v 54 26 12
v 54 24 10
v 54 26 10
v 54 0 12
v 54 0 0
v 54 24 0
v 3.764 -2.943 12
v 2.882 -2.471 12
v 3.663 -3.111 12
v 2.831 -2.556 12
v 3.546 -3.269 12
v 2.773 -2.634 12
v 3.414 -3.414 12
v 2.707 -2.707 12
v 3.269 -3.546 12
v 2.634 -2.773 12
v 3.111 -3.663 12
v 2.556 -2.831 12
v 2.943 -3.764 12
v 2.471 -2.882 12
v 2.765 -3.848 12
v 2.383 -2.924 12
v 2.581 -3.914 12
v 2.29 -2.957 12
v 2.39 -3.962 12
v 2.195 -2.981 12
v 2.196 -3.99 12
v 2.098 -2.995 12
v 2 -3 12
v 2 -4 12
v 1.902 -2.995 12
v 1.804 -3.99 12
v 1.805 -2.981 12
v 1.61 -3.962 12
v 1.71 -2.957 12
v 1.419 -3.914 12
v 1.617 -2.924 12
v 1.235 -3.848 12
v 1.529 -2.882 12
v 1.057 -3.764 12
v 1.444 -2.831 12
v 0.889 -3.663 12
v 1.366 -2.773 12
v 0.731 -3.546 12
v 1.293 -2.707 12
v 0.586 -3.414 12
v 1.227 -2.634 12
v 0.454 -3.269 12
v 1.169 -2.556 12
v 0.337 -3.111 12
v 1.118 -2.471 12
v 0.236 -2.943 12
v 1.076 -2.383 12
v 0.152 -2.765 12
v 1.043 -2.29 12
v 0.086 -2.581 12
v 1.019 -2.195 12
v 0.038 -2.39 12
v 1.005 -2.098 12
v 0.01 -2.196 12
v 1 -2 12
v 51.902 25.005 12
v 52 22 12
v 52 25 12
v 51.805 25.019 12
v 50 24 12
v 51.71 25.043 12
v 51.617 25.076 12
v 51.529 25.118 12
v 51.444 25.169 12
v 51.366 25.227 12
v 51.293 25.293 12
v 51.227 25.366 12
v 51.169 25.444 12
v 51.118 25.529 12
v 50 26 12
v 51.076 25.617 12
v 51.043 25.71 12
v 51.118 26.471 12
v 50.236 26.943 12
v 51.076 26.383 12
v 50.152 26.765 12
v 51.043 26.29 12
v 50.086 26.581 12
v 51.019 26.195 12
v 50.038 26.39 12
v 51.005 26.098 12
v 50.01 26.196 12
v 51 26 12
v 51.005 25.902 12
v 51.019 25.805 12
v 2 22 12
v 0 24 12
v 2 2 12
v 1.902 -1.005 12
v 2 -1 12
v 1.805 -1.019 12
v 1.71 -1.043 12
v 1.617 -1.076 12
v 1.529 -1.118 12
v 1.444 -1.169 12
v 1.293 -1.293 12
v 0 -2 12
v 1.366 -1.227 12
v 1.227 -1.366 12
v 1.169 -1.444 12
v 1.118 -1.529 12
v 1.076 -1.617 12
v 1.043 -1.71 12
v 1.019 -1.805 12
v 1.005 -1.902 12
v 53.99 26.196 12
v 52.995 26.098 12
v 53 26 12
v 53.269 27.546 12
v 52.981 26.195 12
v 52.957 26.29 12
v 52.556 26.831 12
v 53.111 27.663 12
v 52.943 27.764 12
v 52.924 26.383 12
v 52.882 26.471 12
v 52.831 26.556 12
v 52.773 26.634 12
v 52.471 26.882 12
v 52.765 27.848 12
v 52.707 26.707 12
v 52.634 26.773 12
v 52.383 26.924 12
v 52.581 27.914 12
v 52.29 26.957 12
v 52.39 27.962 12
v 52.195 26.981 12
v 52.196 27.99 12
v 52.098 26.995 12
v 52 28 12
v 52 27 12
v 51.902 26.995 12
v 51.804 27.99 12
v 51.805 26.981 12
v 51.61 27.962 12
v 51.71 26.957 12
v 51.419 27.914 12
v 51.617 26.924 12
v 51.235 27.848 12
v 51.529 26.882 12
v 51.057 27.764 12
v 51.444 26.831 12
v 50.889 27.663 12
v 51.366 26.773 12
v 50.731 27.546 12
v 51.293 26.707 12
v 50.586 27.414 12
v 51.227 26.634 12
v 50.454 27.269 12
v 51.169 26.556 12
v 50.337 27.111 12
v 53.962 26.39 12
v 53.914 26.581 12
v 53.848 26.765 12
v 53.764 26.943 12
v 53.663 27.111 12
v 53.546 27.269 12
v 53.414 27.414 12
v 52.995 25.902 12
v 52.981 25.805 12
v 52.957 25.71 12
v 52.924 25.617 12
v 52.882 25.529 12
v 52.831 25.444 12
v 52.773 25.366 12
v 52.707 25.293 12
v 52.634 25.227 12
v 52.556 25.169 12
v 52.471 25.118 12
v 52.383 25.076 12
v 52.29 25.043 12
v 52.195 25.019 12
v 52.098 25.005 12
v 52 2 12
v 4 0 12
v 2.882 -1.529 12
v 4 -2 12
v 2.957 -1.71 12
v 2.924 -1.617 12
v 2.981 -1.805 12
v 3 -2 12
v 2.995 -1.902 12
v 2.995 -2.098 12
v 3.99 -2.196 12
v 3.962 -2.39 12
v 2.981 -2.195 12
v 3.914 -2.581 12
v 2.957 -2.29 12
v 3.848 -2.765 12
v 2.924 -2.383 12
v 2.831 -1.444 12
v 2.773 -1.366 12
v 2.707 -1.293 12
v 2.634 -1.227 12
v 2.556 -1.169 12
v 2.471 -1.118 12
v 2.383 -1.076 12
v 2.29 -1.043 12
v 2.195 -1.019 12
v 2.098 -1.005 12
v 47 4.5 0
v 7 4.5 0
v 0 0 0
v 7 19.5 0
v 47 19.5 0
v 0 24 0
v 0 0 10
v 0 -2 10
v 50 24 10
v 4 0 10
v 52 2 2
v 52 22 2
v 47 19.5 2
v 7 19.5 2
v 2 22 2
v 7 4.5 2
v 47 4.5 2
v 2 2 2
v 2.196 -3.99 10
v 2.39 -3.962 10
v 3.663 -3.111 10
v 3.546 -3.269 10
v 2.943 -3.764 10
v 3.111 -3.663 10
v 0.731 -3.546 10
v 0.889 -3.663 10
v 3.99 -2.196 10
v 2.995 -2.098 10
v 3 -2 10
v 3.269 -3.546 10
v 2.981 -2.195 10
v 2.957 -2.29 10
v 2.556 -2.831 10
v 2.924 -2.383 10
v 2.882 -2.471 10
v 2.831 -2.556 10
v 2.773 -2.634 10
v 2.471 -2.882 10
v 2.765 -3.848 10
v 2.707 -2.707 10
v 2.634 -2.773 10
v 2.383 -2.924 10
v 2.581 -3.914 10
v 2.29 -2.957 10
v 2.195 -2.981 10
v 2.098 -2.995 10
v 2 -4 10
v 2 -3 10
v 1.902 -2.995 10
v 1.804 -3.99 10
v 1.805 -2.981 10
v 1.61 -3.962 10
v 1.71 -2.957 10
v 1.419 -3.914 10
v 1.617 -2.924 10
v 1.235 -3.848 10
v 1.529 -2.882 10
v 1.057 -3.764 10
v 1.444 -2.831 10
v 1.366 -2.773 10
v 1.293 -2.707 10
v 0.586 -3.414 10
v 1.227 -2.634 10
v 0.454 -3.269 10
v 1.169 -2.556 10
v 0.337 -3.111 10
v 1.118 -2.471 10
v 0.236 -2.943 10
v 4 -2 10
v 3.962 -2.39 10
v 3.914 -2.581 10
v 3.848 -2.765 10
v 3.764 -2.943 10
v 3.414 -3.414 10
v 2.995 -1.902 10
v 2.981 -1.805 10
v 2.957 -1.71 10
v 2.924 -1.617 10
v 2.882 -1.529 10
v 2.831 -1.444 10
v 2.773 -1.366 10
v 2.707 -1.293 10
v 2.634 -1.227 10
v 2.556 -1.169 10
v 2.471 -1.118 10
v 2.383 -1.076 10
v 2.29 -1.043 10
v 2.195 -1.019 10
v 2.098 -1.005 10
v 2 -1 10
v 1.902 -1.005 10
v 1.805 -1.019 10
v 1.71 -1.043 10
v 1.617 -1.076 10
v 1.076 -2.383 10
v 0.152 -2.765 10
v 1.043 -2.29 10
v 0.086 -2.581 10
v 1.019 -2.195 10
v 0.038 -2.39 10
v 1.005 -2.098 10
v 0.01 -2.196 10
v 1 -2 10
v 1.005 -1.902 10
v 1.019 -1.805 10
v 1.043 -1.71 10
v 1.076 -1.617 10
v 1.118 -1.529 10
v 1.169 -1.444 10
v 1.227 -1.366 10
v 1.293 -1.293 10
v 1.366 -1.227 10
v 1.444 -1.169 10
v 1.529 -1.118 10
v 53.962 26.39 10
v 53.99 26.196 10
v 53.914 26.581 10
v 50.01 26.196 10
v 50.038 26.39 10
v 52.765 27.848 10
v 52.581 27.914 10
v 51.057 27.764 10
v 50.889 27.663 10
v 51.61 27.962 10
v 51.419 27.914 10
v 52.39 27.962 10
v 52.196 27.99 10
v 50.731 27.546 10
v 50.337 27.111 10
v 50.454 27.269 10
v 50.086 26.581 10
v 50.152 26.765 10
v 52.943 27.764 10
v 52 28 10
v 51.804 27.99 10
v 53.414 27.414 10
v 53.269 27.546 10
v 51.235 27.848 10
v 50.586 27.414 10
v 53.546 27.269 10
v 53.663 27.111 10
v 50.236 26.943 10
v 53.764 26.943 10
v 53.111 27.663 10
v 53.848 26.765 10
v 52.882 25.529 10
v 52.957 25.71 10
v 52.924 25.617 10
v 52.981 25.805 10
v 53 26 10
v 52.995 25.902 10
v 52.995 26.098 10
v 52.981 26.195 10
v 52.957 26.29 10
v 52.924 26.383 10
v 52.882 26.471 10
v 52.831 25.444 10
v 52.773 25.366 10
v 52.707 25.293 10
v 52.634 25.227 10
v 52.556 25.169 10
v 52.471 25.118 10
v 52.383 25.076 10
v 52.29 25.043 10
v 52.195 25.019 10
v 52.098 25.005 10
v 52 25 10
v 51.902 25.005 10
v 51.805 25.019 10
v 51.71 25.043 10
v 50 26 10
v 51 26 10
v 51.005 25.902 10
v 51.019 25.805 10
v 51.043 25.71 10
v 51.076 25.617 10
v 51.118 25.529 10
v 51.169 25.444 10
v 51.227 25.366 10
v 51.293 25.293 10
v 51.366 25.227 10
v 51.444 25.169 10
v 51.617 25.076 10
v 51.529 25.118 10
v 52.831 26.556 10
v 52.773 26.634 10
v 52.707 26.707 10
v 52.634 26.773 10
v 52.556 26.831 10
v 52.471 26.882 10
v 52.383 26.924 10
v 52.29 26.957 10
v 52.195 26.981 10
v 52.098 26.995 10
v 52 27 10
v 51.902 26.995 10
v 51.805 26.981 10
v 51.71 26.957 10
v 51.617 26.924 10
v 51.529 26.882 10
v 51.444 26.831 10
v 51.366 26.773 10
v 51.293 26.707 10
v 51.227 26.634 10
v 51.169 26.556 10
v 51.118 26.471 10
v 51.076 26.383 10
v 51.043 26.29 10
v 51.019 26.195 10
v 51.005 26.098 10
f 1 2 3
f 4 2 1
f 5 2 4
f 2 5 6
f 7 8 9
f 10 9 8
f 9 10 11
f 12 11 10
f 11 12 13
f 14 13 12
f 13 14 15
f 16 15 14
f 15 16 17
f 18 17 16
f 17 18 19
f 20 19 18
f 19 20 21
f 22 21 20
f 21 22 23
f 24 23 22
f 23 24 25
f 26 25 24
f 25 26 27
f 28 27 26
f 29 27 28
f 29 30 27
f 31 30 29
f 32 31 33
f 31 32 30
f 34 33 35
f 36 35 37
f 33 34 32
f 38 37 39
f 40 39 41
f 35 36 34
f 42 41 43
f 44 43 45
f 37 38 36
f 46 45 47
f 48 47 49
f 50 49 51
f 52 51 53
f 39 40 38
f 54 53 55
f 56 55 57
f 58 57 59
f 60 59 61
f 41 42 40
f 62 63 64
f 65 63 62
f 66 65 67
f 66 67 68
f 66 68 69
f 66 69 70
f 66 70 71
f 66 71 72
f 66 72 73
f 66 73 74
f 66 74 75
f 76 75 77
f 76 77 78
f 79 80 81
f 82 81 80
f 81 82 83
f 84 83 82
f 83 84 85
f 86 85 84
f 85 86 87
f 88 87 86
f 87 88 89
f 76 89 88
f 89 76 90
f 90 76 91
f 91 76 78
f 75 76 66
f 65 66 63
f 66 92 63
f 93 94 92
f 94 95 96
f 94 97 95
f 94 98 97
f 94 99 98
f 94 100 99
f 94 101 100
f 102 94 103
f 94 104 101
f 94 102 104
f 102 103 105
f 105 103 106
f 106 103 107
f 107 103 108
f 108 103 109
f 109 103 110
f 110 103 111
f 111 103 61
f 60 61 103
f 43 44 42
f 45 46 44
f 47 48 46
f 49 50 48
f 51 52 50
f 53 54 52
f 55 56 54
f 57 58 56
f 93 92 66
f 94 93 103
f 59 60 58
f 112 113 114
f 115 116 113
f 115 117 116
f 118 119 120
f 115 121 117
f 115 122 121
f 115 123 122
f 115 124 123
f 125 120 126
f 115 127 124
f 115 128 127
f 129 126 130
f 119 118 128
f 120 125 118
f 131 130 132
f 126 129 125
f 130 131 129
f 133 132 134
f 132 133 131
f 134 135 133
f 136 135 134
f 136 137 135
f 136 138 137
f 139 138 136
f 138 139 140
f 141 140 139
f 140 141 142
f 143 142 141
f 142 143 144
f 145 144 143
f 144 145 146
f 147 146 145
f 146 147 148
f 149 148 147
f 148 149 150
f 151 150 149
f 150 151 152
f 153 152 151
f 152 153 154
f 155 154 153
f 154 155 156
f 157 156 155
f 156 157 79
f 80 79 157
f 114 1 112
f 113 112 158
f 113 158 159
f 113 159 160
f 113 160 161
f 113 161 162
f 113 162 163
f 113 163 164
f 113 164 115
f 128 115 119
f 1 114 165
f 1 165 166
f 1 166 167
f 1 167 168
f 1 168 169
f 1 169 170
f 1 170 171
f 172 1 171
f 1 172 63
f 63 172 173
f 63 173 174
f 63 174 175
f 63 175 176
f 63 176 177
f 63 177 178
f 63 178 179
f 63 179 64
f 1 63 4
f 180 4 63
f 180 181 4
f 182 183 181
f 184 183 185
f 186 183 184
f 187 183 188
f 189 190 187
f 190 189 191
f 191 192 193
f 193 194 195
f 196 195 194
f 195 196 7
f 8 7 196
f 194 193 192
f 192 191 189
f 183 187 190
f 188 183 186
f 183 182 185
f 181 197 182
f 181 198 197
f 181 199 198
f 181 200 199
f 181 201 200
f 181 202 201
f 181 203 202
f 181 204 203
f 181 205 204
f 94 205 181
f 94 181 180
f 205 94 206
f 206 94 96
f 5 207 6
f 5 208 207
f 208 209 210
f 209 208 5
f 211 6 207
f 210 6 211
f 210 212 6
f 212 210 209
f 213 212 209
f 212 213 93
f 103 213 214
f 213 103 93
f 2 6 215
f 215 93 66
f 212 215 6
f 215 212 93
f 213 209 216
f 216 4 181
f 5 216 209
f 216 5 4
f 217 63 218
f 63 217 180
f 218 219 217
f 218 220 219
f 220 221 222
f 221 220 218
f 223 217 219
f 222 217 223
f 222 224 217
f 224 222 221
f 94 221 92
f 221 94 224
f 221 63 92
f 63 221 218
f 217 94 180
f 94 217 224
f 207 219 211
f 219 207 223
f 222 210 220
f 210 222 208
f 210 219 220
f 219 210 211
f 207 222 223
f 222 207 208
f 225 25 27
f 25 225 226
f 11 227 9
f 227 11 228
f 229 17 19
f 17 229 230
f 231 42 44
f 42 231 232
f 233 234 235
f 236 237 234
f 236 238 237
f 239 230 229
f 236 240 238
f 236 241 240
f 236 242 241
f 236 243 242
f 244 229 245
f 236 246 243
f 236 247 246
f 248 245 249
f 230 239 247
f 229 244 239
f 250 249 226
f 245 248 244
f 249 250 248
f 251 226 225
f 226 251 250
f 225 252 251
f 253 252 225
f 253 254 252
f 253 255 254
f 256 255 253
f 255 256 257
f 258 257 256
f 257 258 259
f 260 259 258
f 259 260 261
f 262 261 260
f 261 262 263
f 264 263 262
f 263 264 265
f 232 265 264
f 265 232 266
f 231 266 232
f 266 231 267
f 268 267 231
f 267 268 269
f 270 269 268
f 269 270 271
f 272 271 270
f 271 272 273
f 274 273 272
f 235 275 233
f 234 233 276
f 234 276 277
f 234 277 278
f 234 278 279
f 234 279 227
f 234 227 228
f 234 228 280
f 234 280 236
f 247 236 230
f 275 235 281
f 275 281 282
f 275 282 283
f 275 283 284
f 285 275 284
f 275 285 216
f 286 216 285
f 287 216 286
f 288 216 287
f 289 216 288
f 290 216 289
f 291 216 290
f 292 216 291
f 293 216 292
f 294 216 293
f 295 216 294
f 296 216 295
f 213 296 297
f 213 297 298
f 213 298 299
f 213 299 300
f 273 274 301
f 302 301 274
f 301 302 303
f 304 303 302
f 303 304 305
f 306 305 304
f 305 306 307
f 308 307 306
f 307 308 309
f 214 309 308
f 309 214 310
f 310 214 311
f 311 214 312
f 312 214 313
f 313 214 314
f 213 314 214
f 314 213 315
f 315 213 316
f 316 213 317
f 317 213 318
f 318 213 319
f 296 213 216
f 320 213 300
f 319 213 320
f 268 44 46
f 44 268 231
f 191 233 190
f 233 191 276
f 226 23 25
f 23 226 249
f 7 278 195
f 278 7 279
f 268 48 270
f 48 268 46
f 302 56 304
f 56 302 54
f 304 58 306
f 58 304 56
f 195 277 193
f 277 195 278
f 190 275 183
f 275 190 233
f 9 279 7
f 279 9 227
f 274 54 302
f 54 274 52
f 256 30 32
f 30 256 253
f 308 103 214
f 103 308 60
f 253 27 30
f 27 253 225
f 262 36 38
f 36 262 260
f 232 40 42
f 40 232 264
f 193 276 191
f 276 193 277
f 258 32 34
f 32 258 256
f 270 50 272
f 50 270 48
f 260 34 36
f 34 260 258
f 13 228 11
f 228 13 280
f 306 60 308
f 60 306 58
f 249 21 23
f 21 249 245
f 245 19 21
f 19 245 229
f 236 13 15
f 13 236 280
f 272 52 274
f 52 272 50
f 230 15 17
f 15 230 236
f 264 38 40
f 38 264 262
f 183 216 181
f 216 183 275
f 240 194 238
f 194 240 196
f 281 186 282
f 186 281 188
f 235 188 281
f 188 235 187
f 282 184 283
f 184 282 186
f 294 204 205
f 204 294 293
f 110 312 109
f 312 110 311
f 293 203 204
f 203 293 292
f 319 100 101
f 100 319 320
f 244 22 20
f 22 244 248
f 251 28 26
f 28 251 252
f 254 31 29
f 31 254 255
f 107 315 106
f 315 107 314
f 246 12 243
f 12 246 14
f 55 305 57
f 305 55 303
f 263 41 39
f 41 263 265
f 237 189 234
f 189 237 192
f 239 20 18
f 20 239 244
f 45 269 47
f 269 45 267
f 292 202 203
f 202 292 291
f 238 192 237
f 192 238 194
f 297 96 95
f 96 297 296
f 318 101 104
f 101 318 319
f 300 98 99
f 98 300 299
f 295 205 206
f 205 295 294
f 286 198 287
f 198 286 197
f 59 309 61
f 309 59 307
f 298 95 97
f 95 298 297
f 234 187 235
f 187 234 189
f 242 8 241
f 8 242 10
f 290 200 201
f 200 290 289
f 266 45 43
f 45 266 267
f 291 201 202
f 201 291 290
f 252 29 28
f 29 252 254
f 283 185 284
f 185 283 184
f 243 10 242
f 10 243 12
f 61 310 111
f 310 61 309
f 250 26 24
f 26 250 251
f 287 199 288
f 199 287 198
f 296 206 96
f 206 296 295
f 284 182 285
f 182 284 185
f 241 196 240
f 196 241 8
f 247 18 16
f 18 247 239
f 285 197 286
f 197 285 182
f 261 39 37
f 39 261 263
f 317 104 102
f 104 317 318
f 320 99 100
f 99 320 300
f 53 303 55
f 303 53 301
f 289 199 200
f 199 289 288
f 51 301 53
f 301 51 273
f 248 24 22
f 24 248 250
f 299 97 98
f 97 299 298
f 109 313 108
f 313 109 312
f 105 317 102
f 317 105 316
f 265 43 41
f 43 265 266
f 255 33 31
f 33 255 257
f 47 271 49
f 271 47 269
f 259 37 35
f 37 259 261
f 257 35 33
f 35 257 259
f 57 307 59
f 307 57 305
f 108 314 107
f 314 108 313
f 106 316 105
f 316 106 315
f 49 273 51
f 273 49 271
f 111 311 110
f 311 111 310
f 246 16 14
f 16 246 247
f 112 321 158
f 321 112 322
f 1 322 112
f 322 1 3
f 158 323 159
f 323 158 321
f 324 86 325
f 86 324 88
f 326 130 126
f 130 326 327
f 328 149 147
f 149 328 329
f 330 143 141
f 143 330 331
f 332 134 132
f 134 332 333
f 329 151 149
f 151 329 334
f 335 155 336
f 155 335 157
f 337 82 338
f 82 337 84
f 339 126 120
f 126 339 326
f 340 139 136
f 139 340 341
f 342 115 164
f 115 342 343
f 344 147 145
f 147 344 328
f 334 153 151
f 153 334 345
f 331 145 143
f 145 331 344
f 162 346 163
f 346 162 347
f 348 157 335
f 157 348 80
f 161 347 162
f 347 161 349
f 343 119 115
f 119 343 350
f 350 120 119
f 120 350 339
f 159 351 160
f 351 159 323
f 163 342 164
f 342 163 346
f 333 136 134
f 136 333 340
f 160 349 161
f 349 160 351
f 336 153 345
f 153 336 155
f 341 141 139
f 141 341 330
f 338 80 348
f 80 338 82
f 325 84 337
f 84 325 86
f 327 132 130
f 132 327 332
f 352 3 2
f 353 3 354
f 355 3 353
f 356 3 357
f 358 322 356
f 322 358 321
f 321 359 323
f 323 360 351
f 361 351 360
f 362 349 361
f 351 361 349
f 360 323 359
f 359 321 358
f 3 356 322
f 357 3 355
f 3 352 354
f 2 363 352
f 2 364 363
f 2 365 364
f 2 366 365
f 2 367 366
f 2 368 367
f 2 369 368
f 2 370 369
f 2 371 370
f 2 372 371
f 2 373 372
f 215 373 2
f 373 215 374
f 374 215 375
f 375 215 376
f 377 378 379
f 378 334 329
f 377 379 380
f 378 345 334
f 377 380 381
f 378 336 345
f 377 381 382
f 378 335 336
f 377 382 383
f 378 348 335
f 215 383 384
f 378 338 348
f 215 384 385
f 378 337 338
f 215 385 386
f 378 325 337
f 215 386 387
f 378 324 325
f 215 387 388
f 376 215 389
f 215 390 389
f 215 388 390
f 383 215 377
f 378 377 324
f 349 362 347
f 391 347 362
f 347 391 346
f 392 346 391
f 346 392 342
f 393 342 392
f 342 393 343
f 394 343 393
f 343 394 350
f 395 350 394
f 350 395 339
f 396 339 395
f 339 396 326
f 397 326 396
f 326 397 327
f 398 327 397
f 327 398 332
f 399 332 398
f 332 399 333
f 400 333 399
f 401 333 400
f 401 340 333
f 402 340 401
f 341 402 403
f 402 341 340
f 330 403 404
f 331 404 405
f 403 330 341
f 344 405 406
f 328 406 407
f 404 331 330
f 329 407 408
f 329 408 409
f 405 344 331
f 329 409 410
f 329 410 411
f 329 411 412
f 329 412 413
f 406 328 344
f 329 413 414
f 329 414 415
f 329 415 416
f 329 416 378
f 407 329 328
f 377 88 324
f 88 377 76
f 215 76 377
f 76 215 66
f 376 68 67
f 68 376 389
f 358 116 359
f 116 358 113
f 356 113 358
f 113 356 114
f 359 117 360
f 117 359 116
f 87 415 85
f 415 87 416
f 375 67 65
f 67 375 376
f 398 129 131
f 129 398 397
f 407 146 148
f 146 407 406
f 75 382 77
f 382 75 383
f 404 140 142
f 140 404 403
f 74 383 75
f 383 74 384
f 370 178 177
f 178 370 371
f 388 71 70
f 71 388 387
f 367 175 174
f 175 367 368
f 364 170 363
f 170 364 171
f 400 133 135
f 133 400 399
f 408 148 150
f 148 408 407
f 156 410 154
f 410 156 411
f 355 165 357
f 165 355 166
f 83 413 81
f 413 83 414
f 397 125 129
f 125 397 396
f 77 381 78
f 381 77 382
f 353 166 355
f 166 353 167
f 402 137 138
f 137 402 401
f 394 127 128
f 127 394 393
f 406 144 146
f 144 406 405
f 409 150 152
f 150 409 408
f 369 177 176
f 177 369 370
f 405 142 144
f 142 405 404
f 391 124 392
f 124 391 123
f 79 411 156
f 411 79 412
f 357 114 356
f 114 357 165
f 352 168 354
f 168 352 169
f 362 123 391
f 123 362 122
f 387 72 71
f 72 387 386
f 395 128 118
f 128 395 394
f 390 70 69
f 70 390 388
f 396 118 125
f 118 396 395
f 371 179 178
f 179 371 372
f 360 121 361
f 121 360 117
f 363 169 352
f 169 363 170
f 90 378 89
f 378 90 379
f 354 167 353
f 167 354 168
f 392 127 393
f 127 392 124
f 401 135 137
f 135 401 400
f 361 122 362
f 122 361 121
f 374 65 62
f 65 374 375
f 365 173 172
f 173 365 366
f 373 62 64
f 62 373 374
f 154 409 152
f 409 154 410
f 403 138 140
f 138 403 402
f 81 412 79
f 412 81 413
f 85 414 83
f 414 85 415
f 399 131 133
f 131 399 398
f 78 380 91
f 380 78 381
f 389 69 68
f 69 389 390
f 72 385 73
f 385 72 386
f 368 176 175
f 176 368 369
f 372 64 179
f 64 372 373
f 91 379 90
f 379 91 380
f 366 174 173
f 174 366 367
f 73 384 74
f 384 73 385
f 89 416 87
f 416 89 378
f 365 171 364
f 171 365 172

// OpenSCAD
// Параметрическая коробочка с отверстием в дне и ушками сверху по длинным сторонам
$fn = 64;

// --- Внутренние размеры ---
inner_length = 50;   // мм (5 см)
inner_width  = 20;   // мм (2 см)
inner_height = 10;   // мм

// --- Стенки ---
wall = 2;            // мм

// --- Прямоугольное отверстие по центру дна ---
hole_length = 40;    // мм (4 см)
hole_width  = 15;    // мм (1.5 см)

// --- Ушки (по диагонали на длинных сторонах, сверху) ---
ear_hole_d = 2;                      // диаметр отверстия
ear_outer_d = ear_hole_d + 2;        // общий диаметр скруглённой части
ear_height  = wall;                  // высота ушка = толщина стенки
ear_join    = 0.2;                   // небольшое врезание в стенку для прочной склейки

// --- Производные ---
outer_length = inner_length + 2 * wall;
outer_width  = inner_width  + 2 * wall;
outer_height = inner_height + wall;  // дно + стенки, верх открыт

ear_r = ear_outer_d / 2;
ear_x_inset = ear_r;                 // отступ от торца вдоль длинной стороны
ear_z = outer_height - ear_height;   // на верхнем краю

module box_shell() {
    difference() {
        cube([outer_length, outer_width, outer_height]);
        translate([wall, wall, wall])
            cube([inner_length, inner_width, inner_height + 0.01]);
        // отверстие в дне (по центру)
        translate([
            (outer_length - hole_length) / 2,
            (outer_width  - hole_width)  / 2,
            -0.01
        ])
            cube([hole_length, hole_width, wall + 0.02]);
    }
}

// Ушко: прямые боковины от стенки + полукруг снаружи
// dir = -1: растёт в −Y (сторона y=0), dir = +1: в +Y (сторона y=outer_width)
// локально стенка в y=0, отверстие в центре скругления — вне корпуса
module ear(dir = -1) {
    // прямая часть: от врезки в стенку до центра отверстия
    rect_y0 = (dir < 0) ? -ear_r : -ear_join;
    difference() {
        union() {
            // скруглённый край
            translate([0, dir * ear_r, 0])
                cylinder(h = ear_height, d = ear_outer_d);
            // прямые боковины, касательные к окружности
            translate([-ear_r, rect_y0, 0])
                cube([ear_outer_d, ear_r + ear_join, ear_height]);
        }
        translate([0, dir * ear_r, -0.01])
            cylinder(h = ear_height + 0.02, d = ear_hole_d);
    }
}

module ears() {
    translate([ear_x_inset, 0, ear_z])
        ear(-1);
    translate([outer_length - ear_x_inset, outer_width, ear_z])
        ear(+1);
}

union() {
    box_shell();
    ears();
}
